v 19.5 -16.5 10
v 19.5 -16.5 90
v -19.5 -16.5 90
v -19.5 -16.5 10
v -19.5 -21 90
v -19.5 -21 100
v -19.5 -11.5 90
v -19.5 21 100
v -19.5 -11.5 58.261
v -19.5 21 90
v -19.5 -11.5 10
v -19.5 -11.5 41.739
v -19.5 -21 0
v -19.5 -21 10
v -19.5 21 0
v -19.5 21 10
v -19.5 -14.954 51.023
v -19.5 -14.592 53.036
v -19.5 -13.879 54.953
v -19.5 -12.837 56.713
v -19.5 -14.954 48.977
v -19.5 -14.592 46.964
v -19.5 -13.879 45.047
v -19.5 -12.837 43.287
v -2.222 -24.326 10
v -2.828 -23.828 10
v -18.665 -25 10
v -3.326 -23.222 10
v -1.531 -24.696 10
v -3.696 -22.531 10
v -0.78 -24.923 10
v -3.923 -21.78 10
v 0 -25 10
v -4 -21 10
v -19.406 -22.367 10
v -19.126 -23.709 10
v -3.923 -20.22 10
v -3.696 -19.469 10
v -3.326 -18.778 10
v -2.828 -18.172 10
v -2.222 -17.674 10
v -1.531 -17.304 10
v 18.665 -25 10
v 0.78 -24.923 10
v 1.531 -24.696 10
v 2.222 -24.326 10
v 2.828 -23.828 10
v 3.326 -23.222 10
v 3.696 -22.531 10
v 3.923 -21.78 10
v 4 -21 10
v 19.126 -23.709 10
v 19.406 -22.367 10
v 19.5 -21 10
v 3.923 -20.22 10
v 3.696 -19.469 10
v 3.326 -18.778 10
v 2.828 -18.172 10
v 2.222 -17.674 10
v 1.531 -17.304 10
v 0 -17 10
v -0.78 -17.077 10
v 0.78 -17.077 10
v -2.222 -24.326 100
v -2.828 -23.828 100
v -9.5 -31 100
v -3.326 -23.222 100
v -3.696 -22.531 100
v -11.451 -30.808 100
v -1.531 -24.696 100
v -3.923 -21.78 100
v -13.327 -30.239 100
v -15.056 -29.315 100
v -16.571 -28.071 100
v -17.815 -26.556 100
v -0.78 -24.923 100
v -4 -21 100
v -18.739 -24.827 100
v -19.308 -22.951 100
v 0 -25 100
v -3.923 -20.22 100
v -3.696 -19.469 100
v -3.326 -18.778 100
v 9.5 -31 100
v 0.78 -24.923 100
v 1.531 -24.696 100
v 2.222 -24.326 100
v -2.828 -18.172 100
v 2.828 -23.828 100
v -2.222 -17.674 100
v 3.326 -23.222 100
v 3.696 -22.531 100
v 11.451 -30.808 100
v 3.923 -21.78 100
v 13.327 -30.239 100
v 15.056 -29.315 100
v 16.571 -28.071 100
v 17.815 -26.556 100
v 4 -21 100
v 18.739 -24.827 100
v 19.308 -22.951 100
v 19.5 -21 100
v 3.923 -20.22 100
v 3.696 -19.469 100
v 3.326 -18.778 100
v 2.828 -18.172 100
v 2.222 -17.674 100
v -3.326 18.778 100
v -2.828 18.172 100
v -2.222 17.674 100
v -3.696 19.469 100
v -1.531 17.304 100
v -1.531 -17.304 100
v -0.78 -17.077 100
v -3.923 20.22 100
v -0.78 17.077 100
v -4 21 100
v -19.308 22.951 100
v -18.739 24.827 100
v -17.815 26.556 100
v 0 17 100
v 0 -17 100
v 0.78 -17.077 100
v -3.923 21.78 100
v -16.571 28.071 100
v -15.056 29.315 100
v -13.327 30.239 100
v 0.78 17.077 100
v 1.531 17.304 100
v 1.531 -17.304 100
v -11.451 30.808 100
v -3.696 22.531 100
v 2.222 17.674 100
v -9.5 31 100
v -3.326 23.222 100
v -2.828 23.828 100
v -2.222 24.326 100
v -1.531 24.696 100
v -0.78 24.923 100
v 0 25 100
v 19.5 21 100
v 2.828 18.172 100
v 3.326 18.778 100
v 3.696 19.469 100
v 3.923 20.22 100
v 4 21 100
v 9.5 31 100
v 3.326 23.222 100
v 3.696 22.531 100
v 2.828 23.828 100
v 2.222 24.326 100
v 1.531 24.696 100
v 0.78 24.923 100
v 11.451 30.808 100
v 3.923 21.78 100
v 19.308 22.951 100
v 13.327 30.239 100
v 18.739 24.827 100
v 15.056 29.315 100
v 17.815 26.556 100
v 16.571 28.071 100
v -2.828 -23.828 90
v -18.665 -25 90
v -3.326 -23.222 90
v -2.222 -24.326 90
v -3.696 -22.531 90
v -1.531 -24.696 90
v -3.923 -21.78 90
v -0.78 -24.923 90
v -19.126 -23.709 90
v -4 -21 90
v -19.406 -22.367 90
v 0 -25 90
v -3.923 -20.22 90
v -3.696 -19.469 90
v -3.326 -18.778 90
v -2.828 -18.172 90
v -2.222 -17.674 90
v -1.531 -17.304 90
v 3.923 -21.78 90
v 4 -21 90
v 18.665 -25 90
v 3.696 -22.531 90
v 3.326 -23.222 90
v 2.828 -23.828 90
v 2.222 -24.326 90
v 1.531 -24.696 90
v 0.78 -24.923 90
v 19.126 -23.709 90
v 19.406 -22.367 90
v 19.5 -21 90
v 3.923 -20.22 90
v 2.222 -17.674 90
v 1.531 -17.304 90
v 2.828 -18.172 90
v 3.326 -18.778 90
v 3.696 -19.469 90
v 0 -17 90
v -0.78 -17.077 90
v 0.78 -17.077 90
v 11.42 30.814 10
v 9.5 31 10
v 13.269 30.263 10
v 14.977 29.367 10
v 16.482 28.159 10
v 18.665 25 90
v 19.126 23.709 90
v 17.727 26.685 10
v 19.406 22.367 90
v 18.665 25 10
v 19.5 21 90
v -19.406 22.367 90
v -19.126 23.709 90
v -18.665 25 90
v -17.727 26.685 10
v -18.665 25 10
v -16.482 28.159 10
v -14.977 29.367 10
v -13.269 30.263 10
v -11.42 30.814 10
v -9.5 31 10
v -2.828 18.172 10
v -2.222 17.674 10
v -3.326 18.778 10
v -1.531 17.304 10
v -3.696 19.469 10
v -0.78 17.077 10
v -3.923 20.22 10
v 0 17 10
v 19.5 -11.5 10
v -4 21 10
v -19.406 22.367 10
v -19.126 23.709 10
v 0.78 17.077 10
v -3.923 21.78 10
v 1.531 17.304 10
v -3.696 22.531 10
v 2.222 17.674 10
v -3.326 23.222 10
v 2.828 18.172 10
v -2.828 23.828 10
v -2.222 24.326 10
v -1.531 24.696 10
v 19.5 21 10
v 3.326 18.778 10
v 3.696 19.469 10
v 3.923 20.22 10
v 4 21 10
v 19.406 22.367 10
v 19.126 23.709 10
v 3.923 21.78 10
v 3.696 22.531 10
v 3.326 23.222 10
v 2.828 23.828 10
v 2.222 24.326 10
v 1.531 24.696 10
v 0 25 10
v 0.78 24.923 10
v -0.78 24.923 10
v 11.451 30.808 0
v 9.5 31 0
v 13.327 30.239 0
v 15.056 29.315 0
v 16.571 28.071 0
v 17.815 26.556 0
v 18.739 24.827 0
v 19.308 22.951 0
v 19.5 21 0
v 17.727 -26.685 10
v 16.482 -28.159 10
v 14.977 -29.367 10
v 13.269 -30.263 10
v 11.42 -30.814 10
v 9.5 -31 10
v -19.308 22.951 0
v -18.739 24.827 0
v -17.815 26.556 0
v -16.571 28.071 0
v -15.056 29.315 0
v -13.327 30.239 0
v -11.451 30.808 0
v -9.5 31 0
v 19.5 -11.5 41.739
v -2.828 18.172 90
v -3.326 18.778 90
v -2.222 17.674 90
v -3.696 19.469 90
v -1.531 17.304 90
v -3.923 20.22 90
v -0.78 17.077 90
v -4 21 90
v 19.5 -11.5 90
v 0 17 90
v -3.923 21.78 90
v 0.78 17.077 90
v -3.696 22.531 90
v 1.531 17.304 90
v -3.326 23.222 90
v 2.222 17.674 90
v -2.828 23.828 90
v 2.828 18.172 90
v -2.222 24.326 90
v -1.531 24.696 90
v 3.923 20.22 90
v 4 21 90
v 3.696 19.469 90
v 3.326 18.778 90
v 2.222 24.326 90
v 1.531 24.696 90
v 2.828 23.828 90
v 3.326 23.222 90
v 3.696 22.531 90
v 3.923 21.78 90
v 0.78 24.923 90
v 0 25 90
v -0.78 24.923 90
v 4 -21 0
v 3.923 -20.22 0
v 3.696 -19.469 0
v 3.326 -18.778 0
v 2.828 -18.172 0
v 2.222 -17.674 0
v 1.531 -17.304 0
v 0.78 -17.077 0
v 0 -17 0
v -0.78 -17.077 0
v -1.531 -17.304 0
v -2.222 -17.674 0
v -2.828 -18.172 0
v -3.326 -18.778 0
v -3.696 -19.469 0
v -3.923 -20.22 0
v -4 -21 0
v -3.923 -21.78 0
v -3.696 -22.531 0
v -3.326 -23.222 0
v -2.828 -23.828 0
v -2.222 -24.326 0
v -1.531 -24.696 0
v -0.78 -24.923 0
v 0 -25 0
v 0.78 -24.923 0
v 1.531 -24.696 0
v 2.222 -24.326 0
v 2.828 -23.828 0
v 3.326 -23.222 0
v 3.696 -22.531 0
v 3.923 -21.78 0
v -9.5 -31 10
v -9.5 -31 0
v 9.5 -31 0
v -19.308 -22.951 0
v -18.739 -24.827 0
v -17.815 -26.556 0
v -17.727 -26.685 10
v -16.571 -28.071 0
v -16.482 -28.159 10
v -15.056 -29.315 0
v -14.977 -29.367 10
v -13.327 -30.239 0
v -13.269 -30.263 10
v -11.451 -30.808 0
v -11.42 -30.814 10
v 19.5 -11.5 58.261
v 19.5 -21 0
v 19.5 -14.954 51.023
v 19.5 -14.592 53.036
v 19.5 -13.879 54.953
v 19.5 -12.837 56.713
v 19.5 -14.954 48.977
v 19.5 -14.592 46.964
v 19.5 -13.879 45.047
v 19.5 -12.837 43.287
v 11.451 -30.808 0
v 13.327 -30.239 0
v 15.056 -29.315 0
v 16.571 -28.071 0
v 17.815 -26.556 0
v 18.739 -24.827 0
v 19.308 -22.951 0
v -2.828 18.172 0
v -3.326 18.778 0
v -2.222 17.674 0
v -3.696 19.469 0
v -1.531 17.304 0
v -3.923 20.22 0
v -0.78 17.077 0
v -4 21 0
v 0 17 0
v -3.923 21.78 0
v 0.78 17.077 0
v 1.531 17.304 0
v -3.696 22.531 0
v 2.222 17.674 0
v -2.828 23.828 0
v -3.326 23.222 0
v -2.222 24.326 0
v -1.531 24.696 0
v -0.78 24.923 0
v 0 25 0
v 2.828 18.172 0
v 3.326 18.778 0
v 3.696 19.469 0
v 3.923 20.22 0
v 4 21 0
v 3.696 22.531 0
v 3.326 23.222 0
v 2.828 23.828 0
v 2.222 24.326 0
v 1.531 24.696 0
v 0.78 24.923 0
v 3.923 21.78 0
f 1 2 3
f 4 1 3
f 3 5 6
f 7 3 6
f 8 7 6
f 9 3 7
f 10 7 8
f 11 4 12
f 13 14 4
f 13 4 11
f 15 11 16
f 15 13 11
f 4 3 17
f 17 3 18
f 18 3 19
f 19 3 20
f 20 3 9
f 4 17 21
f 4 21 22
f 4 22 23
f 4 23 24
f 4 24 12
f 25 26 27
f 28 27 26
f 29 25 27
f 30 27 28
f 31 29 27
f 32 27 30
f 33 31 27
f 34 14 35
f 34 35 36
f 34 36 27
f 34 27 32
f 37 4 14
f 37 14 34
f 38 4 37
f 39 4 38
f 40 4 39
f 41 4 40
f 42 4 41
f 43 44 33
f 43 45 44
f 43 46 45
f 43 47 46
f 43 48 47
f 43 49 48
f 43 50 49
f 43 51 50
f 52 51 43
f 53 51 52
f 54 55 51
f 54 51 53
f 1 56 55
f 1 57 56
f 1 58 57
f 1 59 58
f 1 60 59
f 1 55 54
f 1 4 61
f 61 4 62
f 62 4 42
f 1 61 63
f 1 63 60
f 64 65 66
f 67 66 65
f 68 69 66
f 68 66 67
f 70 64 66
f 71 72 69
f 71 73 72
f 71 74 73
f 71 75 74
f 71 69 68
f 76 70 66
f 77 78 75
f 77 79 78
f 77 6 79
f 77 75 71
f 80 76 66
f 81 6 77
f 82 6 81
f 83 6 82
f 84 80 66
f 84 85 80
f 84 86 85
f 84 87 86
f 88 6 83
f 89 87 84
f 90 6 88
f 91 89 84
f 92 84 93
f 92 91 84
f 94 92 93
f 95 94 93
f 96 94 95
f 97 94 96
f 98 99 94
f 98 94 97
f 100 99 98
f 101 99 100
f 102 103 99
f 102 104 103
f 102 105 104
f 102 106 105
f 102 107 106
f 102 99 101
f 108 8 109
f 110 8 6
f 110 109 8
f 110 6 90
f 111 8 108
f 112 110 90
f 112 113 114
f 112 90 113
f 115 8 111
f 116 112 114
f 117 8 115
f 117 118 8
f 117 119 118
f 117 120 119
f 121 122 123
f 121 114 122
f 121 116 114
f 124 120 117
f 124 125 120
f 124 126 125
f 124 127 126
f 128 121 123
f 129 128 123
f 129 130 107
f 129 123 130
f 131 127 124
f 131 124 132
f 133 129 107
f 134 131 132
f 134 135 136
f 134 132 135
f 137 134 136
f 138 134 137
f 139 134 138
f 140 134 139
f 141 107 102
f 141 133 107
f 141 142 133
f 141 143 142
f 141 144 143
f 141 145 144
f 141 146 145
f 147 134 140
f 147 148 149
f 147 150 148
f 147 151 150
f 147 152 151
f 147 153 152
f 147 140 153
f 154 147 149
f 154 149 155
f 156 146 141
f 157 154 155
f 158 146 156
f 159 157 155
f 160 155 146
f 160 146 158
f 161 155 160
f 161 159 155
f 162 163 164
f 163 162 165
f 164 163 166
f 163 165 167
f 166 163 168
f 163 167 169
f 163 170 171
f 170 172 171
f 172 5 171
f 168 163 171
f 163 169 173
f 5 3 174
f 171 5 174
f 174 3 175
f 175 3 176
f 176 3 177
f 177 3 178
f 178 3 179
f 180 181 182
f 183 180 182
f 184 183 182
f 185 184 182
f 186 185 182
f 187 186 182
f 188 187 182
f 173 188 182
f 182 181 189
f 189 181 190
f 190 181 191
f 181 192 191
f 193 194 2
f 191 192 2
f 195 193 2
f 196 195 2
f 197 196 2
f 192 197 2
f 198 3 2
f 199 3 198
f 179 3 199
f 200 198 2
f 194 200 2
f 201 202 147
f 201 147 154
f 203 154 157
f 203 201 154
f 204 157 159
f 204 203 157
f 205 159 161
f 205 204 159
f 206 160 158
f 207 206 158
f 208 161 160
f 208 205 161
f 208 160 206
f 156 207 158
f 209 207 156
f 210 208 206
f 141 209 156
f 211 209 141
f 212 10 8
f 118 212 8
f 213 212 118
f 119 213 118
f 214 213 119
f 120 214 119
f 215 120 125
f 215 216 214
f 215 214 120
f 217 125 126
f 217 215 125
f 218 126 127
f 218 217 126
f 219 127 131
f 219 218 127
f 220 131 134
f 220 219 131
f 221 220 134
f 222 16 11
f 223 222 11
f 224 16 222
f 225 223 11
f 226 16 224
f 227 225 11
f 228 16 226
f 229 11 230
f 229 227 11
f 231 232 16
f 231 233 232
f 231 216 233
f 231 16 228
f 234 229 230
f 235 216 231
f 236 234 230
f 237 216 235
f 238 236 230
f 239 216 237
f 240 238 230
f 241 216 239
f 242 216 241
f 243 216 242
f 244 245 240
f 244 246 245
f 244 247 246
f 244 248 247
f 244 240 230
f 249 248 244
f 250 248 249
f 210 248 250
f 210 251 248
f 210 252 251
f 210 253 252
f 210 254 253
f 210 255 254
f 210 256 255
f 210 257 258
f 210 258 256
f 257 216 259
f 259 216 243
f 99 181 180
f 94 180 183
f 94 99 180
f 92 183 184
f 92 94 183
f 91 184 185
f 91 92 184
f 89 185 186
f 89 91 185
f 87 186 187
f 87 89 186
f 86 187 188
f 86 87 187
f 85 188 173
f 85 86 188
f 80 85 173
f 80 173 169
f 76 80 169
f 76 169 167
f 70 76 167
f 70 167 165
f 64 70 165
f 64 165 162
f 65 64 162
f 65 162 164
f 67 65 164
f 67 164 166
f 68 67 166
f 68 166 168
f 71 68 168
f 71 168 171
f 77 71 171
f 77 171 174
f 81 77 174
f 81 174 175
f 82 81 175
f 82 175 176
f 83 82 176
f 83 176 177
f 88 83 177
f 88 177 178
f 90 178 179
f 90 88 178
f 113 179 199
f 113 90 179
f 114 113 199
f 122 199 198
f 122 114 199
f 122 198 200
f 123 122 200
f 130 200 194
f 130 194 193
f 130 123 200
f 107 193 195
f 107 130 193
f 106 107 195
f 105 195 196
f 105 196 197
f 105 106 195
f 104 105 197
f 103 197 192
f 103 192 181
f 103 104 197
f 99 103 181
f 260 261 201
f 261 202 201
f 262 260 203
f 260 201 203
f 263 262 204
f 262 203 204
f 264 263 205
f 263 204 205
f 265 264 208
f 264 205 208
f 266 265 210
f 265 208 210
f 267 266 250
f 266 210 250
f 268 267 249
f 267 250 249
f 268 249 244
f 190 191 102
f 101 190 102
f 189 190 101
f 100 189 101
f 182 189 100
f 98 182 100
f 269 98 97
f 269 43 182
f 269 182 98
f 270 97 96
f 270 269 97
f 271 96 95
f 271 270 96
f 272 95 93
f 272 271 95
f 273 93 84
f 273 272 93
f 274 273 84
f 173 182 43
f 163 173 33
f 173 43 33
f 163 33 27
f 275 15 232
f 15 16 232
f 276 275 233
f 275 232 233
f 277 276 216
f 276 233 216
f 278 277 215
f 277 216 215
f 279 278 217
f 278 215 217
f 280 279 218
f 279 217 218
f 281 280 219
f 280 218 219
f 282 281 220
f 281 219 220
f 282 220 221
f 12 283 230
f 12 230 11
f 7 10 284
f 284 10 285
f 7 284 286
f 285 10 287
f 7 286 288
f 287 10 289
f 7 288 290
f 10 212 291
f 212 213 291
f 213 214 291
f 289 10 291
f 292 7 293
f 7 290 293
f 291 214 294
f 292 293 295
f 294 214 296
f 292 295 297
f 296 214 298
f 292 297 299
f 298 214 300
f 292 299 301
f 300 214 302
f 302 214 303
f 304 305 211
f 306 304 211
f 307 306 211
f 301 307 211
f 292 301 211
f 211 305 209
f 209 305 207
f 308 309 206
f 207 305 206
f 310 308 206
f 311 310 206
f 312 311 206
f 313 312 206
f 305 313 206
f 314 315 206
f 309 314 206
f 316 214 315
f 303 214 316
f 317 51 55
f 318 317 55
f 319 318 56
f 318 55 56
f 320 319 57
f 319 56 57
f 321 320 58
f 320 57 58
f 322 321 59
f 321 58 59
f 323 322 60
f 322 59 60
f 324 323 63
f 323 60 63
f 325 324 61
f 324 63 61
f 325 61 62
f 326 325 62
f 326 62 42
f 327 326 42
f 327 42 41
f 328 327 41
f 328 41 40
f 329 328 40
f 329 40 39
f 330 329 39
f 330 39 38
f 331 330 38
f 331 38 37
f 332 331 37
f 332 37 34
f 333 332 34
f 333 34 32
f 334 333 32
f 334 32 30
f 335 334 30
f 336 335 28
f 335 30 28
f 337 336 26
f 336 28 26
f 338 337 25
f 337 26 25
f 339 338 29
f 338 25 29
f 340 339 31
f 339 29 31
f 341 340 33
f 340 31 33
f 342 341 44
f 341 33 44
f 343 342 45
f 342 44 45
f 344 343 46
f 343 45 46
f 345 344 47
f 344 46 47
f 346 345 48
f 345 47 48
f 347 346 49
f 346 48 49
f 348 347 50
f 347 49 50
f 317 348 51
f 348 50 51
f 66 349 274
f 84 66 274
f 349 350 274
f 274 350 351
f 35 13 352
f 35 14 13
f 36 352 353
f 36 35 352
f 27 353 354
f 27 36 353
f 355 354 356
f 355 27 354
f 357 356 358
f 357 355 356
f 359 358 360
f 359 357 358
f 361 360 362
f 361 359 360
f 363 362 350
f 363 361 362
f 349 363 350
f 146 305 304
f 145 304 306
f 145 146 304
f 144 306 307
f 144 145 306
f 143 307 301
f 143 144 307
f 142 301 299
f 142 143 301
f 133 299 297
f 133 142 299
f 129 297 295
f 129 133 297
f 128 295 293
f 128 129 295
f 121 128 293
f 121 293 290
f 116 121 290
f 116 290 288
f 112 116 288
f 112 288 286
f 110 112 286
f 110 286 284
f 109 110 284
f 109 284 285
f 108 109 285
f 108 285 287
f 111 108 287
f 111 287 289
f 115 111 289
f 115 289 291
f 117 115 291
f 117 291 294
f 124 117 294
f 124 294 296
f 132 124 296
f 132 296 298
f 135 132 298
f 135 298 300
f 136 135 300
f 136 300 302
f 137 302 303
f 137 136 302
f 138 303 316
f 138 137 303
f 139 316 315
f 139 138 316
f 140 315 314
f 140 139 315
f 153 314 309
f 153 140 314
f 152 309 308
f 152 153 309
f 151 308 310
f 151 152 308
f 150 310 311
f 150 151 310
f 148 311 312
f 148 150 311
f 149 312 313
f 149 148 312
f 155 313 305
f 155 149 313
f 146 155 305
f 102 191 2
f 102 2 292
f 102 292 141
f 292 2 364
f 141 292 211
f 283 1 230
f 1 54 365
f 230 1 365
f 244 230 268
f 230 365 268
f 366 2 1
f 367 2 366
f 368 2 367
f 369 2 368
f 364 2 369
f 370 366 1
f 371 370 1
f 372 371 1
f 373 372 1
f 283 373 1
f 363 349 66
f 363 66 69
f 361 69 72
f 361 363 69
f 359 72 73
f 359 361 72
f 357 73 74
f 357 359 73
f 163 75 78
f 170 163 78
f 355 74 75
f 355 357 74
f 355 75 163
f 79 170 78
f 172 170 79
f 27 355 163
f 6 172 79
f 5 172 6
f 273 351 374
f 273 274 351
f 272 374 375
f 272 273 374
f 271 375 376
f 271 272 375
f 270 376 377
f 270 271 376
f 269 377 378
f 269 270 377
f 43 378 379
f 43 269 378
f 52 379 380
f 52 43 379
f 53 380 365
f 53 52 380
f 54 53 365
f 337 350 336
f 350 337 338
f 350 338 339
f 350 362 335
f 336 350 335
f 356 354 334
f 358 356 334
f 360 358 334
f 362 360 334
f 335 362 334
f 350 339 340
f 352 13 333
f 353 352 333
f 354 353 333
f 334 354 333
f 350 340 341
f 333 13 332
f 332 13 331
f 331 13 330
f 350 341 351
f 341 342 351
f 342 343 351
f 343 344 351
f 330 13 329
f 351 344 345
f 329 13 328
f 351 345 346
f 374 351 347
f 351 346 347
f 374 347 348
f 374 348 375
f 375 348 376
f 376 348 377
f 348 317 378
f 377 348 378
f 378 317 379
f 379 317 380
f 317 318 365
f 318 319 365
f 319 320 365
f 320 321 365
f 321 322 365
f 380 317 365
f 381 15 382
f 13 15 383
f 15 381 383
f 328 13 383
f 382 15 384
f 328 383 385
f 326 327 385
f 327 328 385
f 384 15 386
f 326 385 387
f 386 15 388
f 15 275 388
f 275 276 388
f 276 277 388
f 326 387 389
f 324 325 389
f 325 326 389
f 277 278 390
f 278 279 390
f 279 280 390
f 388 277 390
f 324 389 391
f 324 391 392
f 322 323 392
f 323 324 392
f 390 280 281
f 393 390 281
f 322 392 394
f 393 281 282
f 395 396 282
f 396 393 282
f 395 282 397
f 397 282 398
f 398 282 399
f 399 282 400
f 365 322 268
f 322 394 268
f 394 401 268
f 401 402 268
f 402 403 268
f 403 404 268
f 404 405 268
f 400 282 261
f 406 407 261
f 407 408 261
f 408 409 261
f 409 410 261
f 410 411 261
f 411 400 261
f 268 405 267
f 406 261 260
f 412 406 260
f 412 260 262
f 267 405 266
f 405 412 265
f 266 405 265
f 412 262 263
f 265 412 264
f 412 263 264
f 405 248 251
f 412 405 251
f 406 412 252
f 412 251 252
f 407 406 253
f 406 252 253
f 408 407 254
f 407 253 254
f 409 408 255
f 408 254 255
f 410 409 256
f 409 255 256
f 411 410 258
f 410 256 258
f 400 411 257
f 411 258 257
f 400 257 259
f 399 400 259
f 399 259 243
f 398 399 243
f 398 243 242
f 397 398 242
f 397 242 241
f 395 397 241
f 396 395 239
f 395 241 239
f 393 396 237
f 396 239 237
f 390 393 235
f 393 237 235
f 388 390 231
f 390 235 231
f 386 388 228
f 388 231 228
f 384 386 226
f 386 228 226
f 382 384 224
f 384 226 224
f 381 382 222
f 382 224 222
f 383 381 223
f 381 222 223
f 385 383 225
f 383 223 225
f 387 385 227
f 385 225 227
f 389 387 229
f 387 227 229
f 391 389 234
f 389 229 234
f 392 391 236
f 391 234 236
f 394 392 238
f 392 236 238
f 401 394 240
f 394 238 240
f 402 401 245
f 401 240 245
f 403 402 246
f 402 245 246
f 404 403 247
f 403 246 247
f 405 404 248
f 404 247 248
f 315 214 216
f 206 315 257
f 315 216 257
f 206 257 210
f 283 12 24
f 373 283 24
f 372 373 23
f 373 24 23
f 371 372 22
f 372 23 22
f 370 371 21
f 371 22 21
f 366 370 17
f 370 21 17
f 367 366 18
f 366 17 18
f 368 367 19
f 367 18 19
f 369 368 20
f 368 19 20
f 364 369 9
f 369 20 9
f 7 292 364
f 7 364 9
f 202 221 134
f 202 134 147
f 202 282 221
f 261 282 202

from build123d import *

# Parameters (mm, degrees)
ESQUISSE1_W             = 39
ESQUISSE1_H             = 62
BOSS_EXTRU_1_DEPTH      = 10
ESQUISSE2_R             = 4
ENL_V_MAT_EXTRU_1_DEPTH = 10
CONG_1_R                = 10
BOSS_EXTRU_2_DEPTH      = 80
CONG_2_R                = 10
ESQUISSE4_W             = 39
ESQUISSE4_H             = 62
BOSS_EXTRU_3_DEPTH      = 10
CONG_3_START            = 10
CONG_3_DEPTH            = 91
ENL_V_START             = -100
ESQUISSE5_R             = 4
ENL_V_MAT_EXTRU_2_DEPTH = 100
ESQUISSE6_W             = 39
ESQUISSE6_H             = 5
BOSS_EXTRU_4_DEPTH      = 80
ESQUISSE7_R             = 11.5
ENL_V_MAT_EXTRU_3_DEPTH = 112.722871427


with BuildPart() as part:
    # Esquisse1 → Boss.-Extru.1 (new body)
    with BuildSketch(Plane.XY):
        Rectangle(ESQUISSE1_W, ESQUISSE1_H)
    extrude(amount=BOSS_EXTRU_1_DEPTH)

    # Esquisse2 → Enlèv. mat.-Extru.1 (cut)
    with BuildSketch(Plane.XY.offset(10)):
        with Locations((0, 21)):
            Circle(ESQUISSE2_R)
        with Locations((0, -21)):
            Circle(ESQUISSE2_R)
    extrude(amount=-ENL_V_MAT_EXTRU_1_DEPTH, mode=Mode.SUBTRACT)

    # Congé1
    cong_1_edges = [part.edges().sort_by_distance(p)[0] for p in [
        (-19.5, 31, 5),
        (-19.5, -31, 5),
        (19.5, -31, 5),
        (19.5, 31, 5),
    ]]
    fillet(cong_1_edges, radius=CONG_1_R)

    # Esquisse3 → Boss.-Extru.2 (add)
    with BuildSketch(Plane.XY.offset(10)):
        Polygon((0, 25), (19.5, 25), (19.5, 31), (-19.5, 31), (-19.5, 25), align=None)
        Polygon((0, -25), (19.5, -25), (19.5, -31), (-19.5, -31), (-19.5, -25), align=None)
    extrude(amount=BOSS_EXTRU_2_DEPTH)

    # Congé2
    # the kernel refuses this fillet: 10 mm, written as the material it takes off along each edge
    with BuildSketch(Plane(origin=(-19.5, 31, -12.912878475), x_dir=(1, 0, 0), z_dir=(0, 0, 1)), Plane(origin=(19.5, -31, -12.912878475), x_dir=(-1, 0, 0), z_dir=(0, 0, 1))) as cong_2_piece_1:
        with BuildLine():
            CenterArc((9.16515139, -10), CONG_2_R, 90, 66.421821522)
            Line((0, -6), (-0.183303028, -5.92))
            ThreePointArc((-0.183303028, -5.92), (-0.2, -3), (-0.2, 0))
            Line((-0.2, 0), (0, 0.2))
            Line((0, 0.2), (9.16515139, 0.2))
            Line((9.16515139, 0.2), (9.16515139, 0))
        make_face()
    extrude(amount=125.82575695, mode=Mode.SUBTRACT)
    with BuildSketch(Plane(origin=(19.5, 31, -12.912878475), x_dir=(-1, 0, 0), z_dir=(0, 0, 1)), Plane(origin=(-19.5, -31, -12.912878475), x_dir=(1, 0, 0), z_dir=(0, 0, 1))) as cong_2_piece_2:
        with BuildLine():
            CenterArc((9.16515139, 10), CONG_2_R, 203.578178478, 66.421821522)
            Line((0, 6), (-0.183303028, 5.92))
            ThreePointArc((-0.183303028, 5.92), (-0.2, 3), (-0.2, 0))
            Line((-0.2, 0), (0, -0.2))
            Line((0, -0.2), (9.16515139, -0.2))
            Line((9.16515139, -0.2), (9.16515139, 0))
        make_face()
    extrude(amount=125.82575695, mode=Mode.SUBTRACT)

    # Esquisse4 → Boss.-Extru.3 (add)
    with BuildSketch(Plane.XY.offset(90)):
        Rectangle(ESQUISSE4_W, ESQUISSE4_H)
    extrude(amount=BOSS_EXTRU_3_DEPTH)

    # Congé3: read off the stored shape, not the designer's step
    # Congé3 outline → Congé3 (cut)
    with BuildSketch(Plane.XY.offset(CONG_3_START)):
        with BuildLine():
            ThreePointArc((-9.5, -31), (-16.571067812, -28.071067812), (-19.5, -21))
            Line((-19.5, -21), (-19.5, -31))
            Line((-19.5, -31), (-9.5, -31))
        make_face()
        with BuildLine():
            ThreePointArc((19.5, -21), (16.571067812, -28.071067812), (9.5, -31))
            Line((9.5, -31), (19.5, -31))
            Line((19.5, -31), (19.5, -21))
        make_face()
        with BuildLine():
            ThreePointArc((-19.5, 21), (-16.571067812, 28.071067812), (-9.5, 31))
            Line((-9.5, 31), (-19.5, 31))
            Line((-19.5, 31), (-19.5, 21))
        make_face()
        with BuildLine():
            ThreePointArc((9.5, 31), (16.571067812, 28.071067812), (19.5, 21))
            Line((19.5, 21), (19.5, 31))
            Line((19.5, 31), (9.5, 31))
        make_face()
    extrude(amount=CONG_3_DEPTH, mode=Mode.SUBTRACT)

    # Esquisse5 → Enlèv. mat.-Extru.2 (cut)
    with BuildSketch(Plane(origin=(0, 0, 90), x_dir=(-1, 0, 0), z_dir=(0, 0, -1)).offset(ENL_V_START)):
        with Locations(Location((0, 21, 0), (0, 0, 180))):
            Circle(ESQUISSE5_R)
        with Locations(Location((0, -21, 0), (0, 0, 180))):
            Circle(ESQUISSE5_R)
    extrude(amount=ENL_V_MAT_EXTRU_2_DEPTH, mode=Mode.SUBTRACT)

    # Esquisse6 → Boss.-Extru.4 (add)
    with BuildSketch(Plane(origin=(0, 0, 90), x_dir=(-1, 0, 0), z_dir=(0, 0, -1))):
        with Locations((0, -14)):
            Rectangle(ESQUISSE6_W, ESQUISSE6_H)
    extrude(amount=BOSS_EXTRU_4_DEPTH)

    # Esquisse7 → Enlèv. mat.-Extru.3 (cut, through all)
    with BuildSketch(Plane.ZY.offset(19.5)):
        with Locations((50, -3.5)):
            Circle(ESQUISSE7_R)
    extrude(amount=-ENL_V_MAT_EXTRU_3_DEPTH, mode=Mode.SUBTRACT)


solid = part.part
